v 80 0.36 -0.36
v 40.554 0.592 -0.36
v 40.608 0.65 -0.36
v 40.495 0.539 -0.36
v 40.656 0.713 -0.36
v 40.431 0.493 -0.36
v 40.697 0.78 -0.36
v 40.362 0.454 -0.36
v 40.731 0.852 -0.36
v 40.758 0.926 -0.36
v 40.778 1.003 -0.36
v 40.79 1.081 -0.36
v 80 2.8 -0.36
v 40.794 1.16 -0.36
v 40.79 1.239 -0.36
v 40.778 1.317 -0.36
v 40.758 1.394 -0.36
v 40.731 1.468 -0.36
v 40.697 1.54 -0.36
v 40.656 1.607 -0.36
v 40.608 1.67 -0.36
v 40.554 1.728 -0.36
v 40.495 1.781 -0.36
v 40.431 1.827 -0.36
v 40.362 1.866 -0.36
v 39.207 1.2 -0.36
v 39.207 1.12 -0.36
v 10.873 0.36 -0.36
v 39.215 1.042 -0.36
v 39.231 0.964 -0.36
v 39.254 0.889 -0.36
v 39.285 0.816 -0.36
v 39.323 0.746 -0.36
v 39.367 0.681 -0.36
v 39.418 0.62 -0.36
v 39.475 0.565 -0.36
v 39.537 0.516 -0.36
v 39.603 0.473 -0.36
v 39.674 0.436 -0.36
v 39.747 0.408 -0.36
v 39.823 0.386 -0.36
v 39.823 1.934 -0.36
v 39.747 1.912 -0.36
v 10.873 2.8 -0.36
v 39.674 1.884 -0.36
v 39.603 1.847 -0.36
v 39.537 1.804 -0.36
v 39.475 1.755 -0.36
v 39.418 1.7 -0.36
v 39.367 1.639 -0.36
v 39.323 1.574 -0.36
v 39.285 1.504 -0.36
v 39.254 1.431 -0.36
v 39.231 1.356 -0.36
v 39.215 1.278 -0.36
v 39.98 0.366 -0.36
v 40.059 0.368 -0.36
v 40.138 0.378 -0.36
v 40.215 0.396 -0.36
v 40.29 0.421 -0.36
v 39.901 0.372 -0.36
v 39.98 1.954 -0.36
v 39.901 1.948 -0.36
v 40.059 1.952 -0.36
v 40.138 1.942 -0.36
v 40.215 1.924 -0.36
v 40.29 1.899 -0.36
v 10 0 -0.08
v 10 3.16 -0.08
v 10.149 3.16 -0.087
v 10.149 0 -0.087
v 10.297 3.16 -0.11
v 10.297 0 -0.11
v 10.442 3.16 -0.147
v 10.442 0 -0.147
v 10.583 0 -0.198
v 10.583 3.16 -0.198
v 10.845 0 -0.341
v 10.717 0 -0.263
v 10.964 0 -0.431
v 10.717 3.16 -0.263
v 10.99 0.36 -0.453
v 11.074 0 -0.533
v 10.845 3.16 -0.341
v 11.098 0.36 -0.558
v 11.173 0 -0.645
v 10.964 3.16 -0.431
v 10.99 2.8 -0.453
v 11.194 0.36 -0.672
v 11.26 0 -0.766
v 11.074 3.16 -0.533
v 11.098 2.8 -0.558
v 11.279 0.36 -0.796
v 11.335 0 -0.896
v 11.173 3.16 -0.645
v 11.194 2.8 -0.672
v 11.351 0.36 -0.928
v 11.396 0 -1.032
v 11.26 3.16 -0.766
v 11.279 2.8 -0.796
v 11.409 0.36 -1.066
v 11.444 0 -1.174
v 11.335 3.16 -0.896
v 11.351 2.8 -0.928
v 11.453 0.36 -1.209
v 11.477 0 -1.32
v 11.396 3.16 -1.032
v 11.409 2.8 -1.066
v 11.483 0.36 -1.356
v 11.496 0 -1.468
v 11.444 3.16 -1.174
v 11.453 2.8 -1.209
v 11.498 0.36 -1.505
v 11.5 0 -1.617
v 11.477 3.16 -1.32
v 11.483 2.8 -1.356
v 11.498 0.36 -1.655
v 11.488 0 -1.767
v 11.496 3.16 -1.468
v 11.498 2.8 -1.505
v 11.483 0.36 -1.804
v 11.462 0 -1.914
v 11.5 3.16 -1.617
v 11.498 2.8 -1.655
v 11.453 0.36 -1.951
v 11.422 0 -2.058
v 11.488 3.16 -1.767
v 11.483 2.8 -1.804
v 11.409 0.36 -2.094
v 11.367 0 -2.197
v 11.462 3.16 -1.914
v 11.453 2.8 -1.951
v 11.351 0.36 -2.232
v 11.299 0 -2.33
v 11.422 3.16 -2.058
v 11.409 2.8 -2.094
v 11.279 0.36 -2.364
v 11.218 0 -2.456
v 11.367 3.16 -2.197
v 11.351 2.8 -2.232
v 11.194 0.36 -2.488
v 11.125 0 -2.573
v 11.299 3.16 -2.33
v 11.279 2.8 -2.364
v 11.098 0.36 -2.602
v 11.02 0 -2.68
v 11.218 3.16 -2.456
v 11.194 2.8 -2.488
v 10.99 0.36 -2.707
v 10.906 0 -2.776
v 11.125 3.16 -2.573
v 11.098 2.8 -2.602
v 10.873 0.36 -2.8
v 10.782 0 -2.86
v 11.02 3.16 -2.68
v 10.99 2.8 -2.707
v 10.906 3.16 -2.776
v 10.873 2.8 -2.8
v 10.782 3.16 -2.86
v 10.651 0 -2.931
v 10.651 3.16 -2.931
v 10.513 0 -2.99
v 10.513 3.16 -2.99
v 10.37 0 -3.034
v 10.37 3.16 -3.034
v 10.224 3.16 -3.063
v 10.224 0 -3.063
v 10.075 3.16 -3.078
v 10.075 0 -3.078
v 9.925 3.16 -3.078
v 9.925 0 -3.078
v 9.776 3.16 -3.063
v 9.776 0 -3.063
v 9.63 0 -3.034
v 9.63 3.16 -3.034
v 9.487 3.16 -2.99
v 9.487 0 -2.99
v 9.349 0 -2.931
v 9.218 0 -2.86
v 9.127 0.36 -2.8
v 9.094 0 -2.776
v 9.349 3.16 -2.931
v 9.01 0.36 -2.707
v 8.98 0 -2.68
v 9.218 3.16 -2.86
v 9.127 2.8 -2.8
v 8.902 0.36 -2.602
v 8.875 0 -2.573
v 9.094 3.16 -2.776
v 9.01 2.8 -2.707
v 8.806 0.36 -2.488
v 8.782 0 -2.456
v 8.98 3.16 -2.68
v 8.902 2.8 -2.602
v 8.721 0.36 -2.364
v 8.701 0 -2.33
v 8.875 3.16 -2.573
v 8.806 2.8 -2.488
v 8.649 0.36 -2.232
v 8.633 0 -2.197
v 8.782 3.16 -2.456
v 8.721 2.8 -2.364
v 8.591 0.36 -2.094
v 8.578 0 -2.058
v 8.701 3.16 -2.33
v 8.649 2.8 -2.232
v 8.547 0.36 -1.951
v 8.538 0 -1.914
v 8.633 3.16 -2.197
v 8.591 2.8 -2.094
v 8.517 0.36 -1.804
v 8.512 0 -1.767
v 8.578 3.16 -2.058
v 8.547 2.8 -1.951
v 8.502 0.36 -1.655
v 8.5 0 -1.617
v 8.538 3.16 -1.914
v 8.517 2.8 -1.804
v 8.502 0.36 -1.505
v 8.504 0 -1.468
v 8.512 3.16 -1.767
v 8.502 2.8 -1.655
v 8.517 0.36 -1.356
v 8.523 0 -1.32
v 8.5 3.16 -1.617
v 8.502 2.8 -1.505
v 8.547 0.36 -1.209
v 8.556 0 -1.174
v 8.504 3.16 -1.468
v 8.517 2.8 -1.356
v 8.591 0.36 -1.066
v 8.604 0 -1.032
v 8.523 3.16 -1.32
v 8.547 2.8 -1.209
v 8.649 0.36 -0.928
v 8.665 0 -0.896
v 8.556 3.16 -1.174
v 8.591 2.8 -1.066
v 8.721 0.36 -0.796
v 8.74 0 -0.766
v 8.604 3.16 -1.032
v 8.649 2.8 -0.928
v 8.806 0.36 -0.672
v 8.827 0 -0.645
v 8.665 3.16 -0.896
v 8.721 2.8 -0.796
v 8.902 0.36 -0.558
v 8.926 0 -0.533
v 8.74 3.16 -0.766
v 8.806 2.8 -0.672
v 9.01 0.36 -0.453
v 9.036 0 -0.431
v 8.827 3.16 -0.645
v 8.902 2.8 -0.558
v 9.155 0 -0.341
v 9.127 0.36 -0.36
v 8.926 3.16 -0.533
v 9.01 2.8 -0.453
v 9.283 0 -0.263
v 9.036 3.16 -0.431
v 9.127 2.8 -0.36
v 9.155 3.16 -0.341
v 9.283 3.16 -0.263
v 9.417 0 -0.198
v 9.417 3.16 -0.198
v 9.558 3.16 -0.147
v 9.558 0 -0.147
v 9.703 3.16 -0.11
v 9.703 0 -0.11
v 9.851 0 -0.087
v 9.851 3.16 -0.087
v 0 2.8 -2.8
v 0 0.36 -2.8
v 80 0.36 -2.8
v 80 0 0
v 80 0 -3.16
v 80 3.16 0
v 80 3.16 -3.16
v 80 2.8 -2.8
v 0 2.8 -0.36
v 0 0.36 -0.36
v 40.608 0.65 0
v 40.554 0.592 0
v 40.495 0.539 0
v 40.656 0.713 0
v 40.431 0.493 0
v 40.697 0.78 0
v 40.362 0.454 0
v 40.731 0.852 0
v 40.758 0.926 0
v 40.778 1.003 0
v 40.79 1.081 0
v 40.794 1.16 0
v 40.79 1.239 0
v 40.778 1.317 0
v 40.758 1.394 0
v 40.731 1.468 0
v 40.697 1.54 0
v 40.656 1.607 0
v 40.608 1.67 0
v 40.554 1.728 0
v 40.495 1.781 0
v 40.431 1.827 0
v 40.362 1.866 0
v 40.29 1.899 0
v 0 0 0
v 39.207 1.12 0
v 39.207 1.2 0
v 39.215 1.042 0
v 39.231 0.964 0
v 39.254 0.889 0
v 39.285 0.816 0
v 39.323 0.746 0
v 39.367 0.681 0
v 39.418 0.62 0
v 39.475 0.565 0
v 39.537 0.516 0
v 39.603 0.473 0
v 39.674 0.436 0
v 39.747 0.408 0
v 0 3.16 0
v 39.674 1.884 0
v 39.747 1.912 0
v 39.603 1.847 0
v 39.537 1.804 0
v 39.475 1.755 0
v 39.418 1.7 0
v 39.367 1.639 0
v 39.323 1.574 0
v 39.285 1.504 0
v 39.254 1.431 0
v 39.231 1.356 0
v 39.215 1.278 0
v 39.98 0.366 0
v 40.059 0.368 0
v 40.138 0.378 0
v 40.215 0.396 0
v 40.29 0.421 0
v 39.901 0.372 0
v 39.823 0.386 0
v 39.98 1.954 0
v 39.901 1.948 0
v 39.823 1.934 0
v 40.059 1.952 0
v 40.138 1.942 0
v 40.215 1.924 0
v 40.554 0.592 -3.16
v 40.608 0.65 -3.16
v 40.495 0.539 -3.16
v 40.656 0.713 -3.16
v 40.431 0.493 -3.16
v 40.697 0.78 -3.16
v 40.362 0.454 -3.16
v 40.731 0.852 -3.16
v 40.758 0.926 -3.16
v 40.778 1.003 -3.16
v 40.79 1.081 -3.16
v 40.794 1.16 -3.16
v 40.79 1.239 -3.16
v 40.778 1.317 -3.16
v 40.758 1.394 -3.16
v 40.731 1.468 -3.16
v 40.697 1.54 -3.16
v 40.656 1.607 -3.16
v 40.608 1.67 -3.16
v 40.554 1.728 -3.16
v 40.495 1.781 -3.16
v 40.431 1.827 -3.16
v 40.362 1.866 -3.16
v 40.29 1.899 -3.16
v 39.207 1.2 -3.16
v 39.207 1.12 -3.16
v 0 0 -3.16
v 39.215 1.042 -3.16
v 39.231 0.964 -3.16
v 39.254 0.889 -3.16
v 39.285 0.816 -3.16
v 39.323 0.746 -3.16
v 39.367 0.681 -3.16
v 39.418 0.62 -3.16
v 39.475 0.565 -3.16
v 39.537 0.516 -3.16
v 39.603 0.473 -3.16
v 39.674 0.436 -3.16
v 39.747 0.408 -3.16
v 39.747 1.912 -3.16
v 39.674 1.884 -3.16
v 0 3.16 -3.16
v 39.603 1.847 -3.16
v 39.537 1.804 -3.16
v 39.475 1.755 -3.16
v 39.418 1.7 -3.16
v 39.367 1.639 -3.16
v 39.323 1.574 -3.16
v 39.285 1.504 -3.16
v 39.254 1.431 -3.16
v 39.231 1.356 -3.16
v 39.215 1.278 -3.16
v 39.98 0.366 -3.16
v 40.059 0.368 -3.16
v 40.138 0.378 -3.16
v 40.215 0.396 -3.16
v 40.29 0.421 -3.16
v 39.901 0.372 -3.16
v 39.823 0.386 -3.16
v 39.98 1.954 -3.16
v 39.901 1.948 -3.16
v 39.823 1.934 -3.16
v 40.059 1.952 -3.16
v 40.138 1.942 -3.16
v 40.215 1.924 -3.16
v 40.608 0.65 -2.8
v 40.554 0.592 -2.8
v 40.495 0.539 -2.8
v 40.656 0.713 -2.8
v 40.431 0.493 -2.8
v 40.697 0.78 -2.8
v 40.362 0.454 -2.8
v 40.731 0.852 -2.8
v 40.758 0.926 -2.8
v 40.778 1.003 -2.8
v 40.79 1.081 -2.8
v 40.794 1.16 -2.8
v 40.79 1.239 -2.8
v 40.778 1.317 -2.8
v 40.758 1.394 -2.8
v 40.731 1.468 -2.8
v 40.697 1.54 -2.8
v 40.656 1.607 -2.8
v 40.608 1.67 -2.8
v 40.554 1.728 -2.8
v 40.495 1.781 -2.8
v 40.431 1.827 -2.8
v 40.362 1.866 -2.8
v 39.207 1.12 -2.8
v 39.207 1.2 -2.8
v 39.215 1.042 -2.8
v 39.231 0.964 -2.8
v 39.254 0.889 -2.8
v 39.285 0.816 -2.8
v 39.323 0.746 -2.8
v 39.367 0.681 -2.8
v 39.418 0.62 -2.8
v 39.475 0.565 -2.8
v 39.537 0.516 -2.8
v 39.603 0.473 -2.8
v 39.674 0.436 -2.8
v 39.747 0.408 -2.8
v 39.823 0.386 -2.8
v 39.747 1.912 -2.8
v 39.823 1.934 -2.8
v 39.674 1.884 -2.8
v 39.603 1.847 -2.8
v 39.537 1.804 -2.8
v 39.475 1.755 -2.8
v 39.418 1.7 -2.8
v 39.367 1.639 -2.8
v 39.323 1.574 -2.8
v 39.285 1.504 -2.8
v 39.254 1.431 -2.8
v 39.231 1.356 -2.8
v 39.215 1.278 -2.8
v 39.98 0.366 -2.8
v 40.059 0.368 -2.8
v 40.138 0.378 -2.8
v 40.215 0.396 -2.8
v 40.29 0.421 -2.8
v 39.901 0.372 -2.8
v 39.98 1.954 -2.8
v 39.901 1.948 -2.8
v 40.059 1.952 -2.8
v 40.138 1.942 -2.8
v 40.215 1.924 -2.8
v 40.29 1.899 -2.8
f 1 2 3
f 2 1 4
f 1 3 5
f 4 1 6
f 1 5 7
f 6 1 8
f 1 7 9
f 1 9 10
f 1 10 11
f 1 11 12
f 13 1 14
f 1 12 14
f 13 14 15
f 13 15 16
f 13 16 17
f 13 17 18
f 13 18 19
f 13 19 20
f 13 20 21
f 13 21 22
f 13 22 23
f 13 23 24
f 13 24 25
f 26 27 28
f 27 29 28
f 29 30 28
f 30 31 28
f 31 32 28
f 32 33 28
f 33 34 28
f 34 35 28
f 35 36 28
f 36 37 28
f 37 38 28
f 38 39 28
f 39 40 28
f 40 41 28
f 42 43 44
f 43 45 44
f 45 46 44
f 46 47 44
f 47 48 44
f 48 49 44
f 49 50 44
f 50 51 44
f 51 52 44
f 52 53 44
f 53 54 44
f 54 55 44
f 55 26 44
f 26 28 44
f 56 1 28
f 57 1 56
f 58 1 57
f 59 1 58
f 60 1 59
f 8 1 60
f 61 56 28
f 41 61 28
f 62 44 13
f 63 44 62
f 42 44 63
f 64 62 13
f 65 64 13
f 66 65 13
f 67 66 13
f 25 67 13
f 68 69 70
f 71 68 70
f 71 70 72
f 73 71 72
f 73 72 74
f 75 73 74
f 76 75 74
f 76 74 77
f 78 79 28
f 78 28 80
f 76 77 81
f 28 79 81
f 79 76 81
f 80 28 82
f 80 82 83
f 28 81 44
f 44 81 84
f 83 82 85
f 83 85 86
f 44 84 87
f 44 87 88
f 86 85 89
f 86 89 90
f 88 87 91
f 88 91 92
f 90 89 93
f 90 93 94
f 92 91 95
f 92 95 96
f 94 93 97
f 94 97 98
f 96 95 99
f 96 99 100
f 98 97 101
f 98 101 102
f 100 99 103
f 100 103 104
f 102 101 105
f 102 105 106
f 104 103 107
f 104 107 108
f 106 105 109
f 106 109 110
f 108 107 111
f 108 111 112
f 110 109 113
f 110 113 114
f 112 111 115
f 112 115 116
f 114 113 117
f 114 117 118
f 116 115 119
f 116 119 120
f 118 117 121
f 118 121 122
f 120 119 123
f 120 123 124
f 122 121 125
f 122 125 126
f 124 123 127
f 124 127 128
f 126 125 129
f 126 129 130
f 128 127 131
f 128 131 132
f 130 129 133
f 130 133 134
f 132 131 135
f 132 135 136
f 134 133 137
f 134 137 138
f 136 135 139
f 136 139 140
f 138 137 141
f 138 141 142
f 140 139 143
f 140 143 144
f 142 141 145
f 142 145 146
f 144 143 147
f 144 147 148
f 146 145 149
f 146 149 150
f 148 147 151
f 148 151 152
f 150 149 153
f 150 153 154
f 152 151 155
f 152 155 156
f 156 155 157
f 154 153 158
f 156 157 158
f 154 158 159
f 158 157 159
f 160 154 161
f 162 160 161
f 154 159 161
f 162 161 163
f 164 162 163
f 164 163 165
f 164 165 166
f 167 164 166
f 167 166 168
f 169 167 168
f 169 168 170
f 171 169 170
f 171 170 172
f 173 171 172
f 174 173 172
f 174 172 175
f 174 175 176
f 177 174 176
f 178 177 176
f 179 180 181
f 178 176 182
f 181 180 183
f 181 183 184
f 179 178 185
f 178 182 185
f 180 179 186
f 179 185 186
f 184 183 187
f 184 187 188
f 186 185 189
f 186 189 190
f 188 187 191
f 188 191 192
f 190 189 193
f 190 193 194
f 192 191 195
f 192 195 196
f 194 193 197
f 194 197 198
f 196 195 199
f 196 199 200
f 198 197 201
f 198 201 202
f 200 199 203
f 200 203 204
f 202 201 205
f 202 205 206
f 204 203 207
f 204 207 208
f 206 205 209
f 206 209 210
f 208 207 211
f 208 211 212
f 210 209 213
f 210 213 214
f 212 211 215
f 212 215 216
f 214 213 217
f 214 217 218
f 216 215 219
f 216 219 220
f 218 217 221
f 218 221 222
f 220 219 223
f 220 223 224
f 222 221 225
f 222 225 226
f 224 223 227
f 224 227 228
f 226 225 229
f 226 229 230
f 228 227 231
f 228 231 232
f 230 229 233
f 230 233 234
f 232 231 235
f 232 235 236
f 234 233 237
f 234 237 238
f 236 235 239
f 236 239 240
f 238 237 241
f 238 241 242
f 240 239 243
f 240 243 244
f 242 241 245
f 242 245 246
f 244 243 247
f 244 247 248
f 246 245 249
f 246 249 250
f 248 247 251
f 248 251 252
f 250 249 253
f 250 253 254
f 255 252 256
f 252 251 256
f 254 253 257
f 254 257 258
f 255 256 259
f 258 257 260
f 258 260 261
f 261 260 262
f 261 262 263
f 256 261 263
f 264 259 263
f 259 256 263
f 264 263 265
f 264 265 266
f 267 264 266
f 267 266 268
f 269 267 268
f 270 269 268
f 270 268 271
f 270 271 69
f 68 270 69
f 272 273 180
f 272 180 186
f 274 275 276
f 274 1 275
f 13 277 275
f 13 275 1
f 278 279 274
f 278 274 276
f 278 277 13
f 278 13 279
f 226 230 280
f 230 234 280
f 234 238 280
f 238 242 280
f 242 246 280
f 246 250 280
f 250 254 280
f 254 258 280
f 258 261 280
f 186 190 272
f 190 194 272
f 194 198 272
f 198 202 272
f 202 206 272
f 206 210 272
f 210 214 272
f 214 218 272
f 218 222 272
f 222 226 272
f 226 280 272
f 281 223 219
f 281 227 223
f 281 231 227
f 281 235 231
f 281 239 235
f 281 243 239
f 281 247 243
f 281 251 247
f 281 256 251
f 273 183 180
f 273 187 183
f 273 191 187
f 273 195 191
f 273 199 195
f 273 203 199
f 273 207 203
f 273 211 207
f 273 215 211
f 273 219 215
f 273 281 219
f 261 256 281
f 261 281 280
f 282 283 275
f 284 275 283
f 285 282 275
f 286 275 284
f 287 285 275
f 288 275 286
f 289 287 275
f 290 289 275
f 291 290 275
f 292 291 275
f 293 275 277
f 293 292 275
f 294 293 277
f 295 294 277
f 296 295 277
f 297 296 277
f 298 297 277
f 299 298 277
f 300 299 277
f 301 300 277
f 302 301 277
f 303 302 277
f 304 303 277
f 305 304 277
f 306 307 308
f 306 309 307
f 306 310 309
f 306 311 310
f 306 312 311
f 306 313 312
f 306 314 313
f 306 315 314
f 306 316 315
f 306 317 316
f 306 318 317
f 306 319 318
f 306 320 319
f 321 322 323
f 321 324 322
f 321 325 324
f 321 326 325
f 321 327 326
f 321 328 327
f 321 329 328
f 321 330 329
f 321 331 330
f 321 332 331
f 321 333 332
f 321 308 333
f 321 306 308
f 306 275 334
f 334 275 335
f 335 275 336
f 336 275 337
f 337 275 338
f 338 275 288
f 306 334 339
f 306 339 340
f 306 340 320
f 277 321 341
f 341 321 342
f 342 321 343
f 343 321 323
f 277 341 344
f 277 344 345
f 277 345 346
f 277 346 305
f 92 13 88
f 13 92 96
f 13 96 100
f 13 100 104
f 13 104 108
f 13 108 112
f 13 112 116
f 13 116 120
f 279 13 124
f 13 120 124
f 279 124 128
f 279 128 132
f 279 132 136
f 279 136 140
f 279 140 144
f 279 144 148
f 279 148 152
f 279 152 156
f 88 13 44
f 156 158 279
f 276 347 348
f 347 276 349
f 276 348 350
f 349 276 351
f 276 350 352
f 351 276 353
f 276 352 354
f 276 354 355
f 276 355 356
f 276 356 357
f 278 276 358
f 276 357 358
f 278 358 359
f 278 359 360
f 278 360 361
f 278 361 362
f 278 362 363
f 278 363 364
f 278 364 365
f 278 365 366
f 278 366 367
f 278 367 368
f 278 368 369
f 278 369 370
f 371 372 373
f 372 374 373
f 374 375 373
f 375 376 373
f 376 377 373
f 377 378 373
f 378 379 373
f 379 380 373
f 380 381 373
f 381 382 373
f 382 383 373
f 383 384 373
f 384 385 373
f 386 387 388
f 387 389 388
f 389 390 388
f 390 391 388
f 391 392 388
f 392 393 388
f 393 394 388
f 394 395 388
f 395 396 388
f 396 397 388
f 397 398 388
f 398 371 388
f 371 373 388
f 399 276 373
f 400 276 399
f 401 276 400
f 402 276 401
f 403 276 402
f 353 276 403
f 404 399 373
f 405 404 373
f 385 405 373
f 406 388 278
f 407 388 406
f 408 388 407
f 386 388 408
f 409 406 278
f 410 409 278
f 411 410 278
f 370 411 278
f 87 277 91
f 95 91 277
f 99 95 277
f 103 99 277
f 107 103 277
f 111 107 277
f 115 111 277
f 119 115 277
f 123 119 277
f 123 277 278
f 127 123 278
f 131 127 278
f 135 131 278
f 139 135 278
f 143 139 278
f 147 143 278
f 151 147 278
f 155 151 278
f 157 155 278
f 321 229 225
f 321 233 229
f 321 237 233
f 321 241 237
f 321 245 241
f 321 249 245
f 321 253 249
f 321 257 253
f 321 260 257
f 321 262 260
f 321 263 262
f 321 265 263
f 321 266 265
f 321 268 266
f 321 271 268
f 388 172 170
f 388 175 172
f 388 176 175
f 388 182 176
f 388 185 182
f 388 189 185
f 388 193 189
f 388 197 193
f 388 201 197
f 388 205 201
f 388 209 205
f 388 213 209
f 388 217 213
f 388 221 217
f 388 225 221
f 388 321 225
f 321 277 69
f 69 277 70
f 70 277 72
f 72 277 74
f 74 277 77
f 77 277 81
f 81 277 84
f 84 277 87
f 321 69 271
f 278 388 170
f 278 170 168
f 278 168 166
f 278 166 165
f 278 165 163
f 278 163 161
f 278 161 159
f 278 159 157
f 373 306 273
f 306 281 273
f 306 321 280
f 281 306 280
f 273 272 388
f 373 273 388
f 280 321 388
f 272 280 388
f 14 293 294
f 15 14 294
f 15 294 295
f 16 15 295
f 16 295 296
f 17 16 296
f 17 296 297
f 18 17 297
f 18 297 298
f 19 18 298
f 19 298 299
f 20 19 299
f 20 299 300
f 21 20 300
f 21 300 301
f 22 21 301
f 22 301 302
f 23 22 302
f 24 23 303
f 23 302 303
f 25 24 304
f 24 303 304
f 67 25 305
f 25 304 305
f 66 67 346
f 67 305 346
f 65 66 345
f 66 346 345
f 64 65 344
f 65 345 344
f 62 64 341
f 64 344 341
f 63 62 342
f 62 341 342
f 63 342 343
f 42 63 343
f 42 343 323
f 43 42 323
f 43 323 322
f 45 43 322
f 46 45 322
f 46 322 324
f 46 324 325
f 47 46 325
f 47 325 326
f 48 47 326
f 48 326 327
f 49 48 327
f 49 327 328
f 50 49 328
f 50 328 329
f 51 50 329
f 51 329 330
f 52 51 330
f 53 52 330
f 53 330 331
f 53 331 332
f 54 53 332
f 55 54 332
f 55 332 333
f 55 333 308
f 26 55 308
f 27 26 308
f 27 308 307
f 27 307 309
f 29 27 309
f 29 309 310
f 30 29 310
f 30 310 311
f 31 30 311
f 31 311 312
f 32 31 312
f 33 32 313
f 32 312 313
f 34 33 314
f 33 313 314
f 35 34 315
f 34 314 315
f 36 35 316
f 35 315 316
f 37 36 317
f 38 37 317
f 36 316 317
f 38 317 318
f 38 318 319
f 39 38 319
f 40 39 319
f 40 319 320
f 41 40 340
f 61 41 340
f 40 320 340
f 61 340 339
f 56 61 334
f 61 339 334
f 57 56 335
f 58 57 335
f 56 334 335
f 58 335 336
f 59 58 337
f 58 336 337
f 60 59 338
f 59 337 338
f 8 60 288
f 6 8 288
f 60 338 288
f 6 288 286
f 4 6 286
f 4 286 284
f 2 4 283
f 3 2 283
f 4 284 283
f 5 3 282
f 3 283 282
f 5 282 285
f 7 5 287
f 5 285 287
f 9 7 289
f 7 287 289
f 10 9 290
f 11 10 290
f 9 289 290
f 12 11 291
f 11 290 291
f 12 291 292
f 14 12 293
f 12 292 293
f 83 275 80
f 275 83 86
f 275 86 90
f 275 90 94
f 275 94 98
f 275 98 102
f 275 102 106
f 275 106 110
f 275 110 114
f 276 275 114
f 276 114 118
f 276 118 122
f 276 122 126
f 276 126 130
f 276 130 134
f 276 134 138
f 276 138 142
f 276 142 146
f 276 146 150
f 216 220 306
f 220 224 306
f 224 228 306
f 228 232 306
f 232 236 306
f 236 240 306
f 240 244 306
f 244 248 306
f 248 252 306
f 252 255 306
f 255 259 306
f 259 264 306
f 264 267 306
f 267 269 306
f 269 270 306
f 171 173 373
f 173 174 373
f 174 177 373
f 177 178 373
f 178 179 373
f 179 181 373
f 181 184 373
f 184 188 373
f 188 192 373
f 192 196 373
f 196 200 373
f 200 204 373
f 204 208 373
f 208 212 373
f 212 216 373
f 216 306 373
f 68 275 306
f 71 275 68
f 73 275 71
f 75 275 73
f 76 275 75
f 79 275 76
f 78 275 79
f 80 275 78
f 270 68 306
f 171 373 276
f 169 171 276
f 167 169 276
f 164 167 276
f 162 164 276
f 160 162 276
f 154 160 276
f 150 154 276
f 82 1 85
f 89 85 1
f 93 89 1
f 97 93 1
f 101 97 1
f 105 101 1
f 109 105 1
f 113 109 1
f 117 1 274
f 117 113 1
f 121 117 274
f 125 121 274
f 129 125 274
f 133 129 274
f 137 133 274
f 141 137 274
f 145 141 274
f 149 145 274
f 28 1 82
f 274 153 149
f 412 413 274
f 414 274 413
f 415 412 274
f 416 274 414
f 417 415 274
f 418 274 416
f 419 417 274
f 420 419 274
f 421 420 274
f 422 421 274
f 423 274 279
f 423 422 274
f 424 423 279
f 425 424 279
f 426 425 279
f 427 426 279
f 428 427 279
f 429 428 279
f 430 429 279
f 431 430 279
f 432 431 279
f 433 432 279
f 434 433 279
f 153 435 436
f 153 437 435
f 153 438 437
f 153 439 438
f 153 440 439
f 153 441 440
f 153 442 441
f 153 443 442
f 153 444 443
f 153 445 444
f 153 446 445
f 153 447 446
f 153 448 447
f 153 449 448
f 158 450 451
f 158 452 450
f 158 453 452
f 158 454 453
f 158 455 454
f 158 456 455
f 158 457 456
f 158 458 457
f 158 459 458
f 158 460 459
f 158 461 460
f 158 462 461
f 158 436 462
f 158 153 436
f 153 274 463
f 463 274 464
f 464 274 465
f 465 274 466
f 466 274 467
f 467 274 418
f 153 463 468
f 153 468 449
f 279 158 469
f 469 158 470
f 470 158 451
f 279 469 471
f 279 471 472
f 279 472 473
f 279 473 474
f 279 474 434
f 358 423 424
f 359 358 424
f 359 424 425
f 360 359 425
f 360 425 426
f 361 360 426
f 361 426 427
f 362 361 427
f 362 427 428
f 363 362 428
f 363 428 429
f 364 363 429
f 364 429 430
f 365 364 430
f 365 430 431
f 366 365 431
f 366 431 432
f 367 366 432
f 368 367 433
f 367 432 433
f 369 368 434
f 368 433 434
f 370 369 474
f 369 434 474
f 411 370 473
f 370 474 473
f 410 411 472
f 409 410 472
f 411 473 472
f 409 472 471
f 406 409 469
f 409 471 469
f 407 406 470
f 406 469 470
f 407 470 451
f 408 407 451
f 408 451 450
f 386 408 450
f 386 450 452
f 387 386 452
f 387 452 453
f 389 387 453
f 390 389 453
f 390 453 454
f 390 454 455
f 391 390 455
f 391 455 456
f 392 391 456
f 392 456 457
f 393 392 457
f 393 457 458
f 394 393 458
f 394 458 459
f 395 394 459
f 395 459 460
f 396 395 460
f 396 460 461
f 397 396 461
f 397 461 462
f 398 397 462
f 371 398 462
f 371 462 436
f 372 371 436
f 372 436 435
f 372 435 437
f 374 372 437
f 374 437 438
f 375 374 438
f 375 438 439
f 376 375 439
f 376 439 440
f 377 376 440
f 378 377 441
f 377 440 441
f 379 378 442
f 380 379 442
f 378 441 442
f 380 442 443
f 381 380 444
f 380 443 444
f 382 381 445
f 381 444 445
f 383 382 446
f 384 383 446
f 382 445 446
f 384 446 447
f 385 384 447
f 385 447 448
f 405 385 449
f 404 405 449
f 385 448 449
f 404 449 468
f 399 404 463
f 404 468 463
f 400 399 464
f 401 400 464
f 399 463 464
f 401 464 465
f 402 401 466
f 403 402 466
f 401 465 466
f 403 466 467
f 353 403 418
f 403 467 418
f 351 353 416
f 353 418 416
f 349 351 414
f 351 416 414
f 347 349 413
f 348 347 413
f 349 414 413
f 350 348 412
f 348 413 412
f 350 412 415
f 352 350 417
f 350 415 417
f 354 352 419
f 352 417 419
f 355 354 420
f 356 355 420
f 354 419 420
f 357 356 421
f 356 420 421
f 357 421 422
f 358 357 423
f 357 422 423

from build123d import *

# Parameters (mm, degrees)
SKETCH1_W           = 3.16
SKETCH1_H           = 3.16
SKETCH1_W_2         = 2.44
SKETCH1_H_2         = 2.44
BOSS_EXTRUDE1_DEPTH = 80
SKETCH2_R           = 0.79375
CUT_EXTRUDE1_DEPTH  = 81.124722776
SKETCH3_R           = 1.5
CUT_EXTRUDE2_DEPTH  = 81.124722776


with BuildPart() as part:
    # Sketch1 → Boss-Extrude1 (new body)
    with BuildSketch(Plane(origin=(0, 0, 0), x_dir=(0, 0, -1), z_dir=(1, 0, 0))):
        with Locations((1.58, 1.58)):
            Rectangle(SKETCH1_W, SKETCH1_H)
        with Locations((1.58, 1.58)):
            Rectangle(SKETCH1_W_2, SKETCH1_H_2, mode=Mode.SUBTRACT)
    extrude(amount=BOSS_EXTRUDE1_DEPTH)

    # Sketch2 → Cut-Extrude1 (cut, through all)
    with BuildSketch(Plane.XY):
        with Locations((40, 1.16)):
            Circle(SKETCH2_R)
    extrude(amount=-CUT_EXTRUDE1_DEPTH, mode=Mode.SUBTRACT)

    # Sketch3 → Cut-Extrude2 (cut, through all)
    with BuildSketch(Plane(origin=(0, 3.16, 0), x_dir=(1, 0, 0), z_dir=(0, 1, 0))):
        with Locations(Location((10, 1.58, 0), (0, 0, 270))):
            Circle(SKETCH3_R)
    extrude(amount=-CUT_EXTRUDE2_DEPTH, mode=Mode.SUBTRACT)


solid = part.part
